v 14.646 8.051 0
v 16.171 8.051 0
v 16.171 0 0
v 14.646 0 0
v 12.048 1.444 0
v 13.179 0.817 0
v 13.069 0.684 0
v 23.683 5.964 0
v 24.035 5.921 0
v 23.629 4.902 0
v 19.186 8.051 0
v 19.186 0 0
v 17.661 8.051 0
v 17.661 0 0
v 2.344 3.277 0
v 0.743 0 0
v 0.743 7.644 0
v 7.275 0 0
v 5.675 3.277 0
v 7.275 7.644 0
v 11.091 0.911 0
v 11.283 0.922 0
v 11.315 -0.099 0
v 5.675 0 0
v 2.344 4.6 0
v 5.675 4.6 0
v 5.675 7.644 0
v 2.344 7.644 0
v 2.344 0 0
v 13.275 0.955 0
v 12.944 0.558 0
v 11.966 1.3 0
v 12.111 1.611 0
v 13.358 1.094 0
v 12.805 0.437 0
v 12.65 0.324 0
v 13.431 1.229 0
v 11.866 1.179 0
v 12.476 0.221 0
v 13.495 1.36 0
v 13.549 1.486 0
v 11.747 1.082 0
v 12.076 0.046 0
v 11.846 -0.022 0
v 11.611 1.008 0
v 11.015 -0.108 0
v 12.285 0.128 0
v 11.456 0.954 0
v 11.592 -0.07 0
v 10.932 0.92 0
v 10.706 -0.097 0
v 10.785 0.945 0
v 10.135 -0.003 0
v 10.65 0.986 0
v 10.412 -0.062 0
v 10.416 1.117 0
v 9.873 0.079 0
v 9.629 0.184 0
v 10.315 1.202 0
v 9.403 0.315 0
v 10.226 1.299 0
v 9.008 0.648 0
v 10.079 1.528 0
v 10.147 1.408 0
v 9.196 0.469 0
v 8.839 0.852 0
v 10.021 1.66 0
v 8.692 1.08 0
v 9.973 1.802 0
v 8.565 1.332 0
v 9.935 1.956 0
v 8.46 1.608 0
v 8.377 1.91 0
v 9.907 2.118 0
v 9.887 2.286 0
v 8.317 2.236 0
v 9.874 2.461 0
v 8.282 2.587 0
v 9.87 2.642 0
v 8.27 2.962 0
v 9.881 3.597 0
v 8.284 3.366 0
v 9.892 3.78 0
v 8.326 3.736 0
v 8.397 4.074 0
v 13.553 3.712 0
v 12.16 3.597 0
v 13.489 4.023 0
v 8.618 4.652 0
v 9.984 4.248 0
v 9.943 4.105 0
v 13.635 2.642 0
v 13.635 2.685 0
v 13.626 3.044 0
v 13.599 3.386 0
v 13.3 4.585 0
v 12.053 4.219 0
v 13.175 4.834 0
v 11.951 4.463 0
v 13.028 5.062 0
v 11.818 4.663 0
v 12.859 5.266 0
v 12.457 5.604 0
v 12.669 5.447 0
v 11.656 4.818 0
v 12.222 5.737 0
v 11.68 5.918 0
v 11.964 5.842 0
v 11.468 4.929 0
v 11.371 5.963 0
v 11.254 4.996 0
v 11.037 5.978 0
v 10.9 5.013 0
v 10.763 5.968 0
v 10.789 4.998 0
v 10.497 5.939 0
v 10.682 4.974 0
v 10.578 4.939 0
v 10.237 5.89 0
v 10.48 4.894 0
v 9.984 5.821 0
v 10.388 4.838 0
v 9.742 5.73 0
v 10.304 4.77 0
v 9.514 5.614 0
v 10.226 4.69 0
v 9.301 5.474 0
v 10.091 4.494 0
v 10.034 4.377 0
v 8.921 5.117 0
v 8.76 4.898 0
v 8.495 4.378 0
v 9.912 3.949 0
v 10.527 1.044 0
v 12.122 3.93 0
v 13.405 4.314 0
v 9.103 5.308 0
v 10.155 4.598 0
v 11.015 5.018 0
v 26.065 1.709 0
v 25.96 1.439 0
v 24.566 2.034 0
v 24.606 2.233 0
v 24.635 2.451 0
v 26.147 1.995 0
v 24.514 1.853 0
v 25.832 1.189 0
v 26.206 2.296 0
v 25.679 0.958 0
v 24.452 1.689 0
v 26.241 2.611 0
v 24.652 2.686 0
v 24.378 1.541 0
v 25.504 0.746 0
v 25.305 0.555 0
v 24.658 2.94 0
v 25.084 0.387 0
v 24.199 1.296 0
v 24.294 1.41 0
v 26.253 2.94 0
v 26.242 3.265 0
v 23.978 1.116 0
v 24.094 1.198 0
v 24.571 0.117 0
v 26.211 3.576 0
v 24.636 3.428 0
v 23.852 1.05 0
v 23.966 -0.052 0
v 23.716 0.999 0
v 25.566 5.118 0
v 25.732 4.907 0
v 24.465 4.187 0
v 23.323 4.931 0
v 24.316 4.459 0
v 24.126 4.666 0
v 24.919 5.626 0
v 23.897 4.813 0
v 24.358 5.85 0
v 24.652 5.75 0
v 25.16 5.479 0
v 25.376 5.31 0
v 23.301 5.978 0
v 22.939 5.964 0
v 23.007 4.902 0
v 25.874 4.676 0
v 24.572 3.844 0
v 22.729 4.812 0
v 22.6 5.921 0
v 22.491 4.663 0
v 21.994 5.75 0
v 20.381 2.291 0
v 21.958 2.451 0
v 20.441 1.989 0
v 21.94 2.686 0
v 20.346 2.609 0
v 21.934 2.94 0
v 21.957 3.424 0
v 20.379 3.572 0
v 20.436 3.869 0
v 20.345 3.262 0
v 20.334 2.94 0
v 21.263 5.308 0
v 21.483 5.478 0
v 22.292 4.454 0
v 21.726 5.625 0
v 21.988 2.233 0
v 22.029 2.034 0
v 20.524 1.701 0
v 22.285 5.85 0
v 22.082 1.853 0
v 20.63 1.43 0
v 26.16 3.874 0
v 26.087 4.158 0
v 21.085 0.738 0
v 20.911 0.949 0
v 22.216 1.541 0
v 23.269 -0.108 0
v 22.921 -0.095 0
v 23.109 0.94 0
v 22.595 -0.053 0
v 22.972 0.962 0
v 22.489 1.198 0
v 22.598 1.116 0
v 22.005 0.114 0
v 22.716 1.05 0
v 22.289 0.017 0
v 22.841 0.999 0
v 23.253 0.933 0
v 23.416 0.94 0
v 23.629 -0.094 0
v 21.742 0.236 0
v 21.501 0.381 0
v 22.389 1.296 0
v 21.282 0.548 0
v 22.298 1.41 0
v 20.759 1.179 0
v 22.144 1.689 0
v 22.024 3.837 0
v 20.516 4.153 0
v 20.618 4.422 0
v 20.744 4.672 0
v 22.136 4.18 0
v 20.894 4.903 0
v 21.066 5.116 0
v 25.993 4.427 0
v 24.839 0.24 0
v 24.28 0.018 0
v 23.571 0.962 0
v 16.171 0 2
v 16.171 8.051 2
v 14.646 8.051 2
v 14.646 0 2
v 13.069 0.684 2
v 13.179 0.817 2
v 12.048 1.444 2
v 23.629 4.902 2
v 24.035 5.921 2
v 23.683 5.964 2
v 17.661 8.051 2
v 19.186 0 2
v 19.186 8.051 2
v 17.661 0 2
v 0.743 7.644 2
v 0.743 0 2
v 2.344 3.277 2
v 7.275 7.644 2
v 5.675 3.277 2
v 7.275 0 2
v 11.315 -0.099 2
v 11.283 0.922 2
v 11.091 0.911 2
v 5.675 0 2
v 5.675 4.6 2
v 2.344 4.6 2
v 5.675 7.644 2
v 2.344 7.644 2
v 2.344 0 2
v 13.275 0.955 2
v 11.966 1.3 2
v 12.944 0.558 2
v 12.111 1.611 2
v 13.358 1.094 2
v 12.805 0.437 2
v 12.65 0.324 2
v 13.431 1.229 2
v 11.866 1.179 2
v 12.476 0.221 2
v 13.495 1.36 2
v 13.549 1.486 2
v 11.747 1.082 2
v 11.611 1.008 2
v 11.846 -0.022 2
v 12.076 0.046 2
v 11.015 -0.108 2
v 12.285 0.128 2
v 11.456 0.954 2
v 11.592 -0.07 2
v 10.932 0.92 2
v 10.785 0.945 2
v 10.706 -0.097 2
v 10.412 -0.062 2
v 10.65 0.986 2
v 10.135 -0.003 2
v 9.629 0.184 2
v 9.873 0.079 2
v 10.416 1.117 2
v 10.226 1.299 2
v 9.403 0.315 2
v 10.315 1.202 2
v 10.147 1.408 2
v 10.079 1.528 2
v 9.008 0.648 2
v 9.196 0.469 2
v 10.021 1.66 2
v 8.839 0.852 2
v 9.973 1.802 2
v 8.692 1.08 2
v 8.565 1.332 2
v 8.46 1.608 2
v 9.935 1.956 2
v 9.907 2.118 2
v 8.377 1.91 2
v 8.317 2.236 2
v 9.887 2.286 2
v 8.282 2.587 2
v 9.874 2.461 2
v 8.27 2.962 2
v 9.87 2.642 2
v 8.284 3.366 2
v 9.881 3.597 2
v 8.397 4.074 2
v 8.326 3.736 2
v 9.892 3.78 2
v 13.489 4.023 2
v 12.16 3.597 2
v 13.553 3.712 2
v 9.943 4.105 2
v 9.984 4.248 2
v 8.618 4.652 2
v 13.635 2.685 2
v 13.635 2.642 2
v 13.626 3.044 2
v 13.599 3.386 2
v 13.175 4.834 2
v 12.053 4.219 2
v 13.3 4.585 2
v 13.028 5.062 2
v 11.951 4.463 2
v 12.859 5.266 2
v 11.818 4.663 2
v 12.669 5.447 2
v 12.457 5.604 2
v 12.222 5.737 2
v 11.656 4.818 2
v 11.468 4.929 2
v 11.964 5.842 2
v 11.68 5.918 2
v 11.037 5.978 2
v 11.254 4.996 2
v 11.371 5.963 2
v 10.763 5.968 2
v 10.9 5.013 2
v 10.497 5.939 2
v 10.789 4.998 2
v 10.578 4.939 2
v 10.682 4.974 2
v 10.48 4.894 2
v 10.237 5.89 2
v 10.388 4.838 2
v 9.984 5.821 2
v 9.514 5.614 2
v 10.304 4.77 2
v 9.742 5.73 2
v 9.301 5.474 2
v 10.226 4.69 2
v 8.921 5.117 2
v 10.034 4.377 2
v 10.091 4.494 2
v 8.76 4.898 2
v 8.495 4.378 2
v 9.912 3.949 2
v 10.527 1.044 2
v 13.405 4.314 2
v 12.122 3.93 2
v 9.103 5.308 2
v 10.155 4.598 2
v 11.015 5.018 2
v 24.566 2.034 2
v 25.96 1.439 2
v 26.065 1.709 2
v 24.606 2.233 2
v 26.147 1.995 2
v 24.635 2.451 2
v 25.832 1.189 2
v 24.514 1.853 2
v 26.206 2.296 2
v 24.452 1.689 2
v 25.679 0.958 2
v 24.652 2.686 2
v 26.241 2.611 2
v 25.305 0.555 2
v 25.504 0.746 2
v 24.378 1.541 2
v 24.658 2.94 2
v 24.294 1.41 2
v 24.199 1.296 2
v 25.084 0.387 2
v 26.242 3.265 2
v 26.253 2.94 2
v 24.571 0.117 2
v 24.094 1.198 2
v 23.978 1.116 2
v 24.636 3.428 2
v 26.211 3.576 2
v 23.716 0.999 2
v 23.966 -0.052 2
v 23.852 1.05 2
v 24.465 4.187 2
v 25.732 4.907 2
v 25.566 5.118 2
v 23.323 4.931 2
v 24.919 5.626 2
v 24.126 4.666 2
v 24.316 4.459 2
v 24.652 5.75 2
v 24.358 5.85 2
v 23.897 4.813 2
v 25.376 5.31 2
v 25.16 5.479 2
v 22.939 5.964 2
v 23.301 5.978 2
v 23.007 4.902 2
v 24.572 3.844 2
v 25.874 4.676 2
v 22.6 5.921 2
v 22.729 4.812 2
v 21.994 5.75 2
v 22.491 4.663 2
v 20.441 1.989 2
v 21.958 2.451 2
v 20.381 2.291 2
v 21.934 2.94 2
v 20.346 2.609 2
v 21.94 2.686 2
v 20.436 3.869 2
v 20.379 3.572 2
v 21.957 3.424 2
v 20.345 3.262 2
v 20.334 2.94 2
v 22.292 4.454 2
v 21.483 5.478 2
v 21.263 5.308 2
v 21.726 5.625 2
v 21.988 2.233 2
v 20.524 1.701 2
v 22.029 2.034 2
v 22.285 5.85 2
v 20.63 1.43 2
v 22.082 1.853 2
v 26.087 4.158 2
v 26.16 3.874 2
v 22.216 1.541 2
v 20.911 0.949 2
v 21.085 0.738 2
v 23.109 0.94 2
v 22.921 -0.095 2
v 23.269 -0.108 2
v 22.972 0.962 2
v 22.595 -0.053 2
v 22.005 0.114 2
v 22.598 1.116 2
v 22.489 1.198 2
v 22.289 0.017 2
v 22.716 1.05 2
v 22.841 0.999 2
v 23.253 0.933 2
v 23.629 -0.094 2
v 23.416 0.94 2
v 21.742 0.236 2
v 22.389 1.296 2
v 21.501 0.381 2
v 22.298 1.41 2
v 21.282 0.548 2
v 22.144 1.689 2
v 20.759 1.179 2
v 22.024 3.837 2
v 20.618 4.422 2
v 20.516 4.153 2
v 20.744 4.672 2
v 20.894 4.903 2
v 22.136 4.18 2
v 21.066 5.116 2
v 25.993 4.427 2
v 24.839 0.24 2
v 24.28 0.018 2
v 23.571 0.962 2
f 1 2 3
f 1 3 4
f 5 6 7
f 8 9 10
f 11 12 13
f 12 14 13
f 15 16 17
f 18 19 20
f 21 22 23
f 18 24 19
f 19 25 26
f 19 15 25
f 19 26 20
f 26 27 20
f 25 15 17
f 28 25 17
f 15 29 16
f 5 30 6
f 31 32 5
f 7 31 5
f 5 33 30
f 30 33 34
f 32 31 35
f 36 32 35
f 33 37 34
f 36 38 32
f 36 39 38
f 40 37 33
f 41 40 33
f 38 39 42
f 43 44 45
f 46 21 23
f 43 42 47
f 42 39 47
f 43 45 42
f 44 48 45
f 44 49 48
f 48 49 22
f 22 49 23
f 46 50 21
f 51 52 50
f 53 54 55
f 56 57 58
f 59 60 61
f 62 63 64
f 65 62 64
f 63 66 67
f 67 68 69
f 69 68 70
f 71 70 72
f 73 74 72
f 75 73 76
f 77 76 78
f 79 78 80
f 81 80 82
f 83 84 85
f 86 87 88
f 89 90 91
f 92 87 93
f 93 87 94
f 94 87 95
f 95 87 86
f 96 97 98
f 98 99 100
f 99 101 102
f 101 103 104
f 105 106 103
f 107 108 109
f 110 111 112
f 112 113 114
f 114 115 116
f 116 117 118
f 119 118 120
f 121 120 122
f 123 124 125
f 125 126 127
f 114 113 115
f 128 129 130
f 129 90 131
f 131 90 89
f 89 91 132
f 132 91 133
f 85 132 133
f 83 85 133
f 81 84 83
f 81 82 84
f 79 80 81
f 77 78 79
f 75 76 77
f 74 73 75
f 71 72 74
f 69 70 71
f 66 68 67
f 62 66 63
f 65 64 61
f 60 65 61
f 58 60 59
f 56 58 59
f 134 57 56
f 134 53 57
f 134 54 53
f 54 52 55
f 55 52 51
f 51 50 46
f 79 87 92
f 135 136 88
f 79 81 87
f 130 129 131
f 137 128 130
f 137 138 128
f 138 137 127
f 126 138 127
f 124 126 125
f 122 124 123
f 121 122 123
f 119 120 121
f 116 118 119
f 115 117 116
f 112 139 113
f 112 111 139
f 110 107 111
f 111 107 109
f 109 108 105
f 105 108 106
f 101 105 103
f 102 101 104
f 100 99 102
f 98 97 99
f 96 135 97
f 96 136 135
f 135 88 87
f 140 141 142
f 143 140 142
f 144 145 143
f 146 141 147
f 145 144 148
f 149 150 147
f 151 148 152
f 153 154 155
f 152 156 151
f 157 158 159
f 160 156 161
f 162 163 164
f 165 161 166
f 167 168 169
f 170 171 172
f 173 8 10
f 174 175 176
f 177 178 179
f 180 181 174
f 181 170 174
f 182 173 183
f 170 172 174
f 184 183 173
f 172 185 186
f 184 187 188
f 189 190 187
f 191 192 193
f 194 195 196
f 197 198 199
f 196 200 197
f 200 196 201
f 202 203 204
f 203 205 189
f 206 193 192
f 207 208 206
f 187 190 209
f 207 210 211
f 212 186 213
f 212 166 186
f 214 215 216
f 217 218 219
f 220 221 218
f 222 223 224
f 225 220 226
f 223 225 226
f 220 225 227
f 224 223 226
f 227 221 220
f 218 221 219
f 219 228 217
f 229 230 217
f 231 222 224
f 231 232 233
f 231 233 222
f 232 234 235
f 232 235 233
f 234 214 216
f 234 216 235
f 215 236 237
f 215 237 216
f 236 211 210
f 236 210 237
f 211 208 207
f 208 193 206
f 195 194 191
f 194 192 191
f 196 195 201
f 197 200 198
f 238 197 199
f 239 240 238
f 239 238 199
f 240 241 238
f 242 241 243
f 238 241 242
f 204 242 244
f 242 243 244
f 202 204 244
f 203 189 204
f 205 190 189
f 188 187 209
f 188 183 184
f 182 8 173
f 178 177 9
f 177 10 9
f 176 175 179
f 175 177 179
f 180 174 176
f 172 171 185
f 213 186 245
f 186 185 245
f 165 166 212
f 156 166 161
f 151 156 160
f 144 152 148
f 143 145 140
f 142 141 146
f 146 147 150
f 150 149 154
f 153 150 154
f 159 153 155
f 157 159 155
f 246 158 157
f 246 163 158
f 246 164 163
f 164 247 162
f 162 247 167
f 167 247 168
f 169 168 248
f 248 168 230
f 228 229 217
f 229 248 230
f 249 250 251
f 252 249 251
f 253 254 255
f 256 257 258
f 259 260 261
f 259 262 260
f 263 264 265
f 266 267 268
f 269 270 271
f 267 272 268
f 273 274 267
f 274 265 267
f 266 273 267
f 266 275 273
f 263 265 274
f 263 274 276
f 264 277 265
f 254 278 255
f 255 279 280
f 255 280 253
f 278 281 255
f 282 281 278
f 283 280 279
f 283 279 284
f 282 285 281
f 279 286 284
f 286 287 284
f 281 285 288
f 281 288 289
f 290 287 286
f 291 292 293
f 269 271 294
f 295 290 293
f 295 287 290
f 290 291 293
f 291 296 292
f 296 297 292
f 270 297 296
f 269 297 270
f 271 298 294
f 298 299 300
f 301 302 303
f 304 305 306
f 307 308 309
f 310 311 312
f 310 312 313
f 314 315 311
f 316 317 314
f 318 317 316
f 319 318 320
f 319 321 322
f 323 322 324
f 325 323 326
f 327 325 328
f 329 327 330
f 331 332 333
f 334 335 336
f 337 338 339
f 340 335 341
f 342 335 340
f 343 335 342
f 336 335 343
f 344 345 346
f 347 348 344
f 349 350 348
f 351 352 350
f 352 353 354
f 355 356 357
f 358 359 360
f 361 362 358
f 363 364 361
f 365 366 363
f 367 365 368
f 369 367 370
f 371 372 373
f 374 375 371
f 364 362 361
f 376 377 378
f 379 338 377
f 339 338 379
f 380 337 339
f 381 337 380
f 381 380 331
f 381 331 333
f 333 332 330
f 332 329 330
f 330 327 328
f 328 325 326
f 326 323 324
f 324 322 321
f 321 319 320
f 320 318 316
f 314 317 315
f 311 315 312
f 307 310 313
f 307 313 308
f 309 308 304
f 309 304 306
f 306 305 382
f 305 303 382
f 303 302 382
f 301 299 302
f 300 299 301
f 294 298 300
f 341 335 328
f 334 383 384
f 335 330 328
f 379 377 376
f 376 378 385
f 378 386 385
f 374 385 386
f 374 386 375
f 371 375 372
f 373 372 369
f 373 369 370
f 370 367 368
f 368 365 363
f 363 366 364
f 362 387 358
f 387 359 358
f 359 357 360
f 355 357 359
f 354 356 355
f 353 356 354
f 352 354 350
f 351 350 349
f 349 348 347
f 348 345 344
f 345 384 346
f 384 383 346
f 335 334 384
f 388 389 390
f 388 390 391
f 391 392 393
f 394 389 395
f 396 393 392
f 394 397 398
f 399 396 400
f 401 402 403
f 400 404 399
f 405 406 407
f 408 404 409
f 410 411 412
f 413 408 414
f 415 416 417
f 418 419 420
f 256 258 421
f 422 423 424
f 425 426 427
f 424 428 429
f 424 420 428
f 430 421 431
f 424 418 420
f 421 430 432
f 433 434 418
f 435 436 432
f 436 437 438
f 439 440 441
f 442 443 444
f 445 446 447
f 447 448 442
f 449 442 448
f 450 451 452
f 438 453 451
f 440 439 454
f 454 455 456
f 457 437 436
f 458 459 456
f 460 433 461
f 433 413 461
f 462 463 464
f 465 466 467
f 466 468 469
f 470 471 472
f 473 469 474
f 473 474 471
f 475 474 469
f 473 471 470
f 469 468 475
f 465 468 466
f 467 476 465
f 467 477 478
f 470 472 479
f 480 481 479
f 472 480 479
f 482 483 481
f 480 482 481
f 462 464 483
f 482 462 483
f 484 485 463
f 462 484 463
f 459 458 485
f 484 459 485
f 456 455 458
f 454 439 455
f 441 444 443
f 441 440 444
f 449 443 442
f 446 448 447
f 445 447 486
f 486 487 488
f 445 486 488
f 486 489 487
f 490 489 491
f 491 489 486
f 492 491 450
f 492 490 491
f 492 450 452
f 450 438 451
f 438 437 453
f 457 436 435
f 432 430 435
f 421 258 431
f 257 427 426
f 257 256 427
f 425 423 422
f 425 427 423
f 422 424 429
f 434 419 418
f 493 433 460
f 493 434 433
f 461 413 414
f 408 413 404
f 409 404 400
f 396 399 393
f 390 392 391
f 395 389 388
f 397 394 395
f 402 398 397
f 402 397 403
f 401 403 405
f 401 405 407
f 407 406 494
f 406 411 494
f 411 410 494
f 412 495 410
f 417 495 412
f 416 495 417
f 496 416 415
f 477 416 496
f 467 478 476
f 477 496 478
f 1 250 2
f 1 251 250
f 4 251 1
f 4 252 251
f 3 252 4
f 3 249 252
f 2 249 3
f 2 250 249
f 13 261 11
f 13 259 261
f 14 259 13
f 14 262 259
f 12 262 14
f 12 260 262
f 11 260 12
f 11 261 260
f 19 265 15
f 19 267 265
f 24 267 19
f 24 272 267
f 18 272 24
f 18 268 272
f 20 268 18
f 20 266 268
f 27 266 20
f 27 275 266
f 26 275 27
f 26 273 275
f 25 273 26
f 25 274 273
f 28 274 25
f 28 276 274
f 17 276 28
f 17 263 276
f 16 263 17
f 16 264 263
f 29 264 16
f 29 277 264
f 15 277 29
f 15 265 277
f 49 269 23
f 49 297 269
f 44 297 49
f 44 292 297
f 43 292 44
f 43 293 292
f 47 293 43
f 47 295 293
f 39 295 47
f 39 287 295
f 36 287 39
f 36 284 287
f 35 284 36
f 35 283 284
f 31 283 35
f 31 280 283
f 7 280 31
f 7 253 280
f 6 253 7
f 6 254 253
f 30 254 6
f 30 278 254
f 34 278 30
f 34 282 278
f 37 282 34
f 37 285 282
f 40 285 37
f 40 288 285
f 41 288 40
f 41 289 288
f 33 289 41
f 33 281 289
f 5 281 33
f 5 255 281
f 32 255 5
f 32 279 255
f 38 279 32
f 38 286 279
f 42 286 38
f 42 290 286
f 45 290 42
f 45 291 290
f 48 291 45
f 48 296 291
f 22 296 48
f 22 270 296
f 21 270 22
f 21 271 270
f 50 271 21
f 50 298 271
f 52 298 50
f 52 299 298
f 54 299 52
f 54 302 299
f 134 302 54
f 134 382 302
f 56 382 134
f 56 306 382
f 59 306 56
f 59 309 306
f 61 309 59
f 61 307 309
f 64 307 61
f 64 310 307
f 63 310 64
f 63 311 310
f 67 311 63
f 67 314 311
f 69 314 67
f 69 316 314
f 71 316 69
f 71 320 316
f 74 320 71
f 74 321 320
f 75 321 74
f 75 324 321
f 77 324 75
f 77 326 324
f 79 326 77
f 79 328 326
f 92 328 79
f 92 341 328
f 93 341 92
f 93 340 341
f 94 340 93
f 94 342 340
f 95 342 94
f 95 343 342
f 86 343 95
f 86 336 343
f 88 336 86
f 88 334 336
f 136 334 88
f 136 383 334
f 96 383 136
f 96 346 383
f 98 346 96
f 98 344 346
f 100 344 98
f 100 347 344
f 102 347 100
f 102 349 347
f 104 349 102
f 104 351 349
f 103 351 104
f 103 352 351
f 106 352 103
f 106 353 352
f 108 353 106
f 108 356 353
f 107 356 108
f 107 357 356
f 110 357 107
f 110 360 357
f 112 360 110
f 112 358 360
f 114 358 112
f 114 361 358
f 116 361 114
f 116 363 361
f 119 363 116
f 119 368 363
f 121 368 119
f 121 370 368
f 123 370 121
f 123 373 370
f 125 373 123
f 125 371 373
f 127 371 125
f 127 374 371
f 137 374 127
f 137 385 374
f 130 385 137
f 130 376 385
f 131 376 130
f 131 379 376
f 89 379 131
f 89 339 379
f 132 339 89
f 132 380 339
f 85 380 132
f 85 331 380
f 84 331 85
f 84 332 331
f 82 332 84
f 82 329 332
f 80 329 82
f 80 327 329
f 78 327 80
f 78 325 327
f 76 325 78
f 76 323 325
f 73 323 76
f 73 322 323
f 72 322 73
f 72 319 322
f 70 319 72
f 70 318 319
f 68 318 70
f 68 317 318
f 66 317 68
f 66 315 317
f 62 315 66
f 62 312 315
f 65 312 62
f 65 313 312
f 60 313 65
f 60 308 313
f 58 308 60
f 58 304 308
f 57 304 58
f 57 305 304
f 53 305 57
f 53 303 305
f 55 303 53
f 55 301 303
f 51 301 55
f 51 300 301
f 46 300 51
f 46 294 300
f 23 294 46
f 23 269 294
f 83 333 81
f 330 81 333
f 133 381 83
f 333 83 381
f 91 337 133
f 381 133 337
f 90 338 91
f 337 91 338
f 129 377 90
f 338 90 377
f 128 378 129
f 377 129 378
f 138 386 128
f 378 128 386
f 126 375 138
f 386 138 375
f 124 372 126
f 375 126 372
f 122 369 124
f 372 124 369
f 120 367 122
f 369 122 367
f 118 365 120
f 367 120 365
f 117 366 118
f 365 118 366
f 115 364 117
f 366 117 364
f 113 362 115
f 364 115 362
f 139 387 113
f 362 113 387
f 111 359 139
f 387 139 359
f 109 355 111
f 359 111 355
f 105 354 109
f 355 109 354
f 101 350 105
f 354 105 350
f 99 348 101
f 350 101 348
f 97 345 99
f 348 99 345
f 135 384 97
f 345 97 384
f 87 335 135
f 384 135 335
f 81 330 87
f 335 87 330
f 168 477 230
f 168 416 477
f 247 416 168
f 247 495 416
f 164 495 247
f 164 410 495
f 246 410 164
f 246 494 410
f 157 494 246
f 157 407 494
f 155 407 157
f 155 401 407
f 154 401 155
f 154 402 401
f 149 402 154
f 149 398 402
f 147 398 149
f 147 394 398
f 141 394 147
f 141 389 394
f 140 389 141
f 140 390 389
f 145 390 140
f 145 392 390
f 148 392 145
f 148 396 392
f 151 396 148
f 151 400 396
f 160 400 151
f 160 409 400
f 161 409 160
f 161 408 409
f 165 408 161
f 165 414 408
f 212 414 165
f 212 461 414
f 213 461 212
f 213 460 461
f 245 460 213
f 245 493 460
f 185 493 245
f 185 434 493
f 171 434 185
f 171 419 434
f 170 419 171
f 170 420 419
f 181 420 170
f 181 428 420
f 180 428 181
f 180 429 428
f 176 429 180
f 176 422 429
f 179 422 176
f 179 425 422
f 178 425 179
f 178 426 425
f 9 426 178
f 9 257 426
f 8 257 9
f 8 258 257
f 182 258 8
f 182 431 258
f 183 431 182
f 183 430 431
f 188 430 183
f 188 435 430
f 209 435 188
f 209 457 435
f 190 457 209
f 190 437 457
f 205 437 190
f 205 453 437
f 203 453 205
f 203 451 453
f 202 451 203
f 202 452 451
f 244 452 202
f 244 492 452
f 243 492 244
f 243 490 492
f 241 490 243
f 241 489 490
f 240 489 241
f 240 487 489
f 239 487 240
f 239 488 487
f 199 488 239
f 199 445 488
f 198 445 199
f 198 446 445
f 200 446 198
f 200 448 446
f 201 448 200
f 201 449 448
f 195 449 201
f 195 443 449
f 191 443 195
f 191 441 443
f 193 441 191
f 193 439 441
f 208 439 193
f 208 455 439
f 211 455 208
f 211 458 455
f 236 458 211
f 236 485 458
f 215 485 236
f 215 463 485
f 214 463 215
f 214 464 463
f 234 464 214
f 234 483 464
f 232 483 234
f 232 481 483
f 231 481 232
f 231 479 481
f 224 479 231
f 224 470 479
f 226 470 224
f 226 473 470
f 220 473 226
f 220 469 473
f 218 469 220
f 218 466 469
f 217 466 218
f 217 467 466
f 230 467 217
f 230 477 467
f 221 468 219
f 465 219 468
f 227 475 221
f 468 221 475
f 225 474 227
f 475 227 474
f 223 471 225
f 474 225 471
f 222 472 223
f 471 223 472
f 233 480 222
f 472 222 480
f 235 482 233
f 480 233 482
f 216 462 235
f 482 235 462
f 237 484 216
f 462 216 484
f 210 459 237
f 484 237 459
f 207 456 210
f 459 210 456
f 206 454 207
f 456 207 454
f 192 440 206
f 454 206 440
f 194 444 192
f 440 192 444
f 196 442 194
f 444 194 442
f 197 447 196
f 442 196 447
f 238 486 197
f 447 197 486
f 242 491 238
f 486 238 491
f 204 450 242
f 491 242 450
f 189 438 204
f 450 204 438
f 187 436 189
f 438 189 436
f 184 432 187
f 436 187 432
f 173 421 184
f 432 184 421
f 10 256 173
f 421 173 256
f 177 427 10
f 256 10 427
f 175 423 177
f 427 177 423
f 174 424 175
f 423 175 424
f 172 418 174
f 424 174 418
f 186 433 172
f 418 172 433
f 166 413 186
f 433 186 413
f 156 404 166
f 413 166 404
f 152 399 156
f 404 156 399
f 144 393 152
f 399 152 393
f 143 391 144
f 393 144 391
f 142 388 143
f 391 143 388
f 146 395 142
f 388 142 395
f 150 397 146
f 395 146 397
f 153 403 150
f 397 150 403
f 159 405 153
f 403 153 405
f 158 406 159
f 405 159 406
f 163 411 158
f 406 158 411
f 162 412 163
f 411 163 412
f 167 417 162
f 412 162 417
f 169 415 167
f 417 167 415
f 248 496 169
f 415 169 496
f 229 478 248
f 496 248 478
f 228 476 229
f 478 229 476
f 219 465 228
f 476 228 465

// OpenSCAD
// expect: so the text uses Liberation Sans instead
linear_extrude(2) text("Hello", size = 8, font = "Arial:style=Bold");
